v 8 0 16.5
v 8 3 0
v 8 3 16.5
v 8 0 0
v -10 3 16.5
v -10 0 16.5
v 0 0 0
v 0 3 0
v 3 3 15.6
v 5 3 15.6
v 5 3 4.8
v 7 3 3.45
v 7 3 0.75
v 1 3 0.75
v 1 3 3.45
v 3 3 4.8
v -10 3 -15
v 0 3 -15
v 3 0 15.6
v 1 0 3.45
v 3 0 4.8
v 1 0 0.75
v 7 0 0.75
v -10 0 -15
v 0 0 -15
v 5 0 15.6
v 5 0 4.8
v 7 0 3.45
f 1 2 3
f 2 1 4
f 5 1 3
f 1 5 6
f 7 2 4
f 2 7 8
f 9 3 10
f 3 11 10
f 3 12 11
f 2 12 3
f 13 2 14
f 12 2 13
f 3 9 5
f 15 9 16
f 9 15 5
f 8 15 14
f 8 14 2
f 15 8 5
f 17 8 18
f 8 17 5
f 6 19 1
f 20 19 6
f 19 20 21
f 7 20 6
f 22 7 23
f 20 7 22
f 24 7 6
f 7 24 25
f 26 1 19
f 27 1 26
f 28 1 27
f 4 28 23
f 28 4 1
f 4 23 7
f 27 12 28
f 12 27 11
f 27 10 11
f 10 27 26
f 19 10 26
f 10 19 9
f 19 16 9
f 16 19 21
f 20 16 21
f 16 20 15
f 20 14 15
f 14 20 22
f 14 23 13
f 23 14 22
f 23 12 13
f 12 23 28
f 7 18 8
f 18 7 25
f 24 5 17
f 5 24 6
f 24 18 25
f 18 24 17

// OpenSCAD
// file: spiral_extrude.scad
//Copyright 2018 Douglas Peale
//This transformation extrudes a two dimmenional shape in a spiral. It fills the gap between linear_extrude and rotate_extrude
//This is released under the GPL version 3.0
//
// Note that this uses linear_extrude to create segments of the spiral and piece them together. Twist is used to get the pieces to mate up properly.
// This makes the job much more complicated than it would have been if I could get access to the data points of the 2D objects this function is passed.
// Version 2.0
// Add capability of having Height=0 for flat spirals
// Fix Starts so that it actually works
// Version 3.0
// Reimplemented this function to simplify it, and allow circular and circular arc extrudes.
// fixed bug that prevented acurate heights and arc lengths from being implemented (previously an integer number of segments was used).
// Wrote wraper function with old name for backwards compatibility.
// Version 3.1
// fixed a bug where one more step than requested was added to the spiral.

//Simple Example
    //Multiple shapes, start and end radius the same
spiral_extrude(Radius=19, EndRadius=19, Pitch=10, Height=30, StepsPerRev=50, Starts=1){circle($fn=20,1);translate([10,0,0])rotate([0,0,20])square([5,2],center=true);}

    //Start and End radius different, negative pitch
translate([0,60,0])spiral_extrude(Radius=19, EndRadius=5, Pitch=-10, Height=30, StepsPerRev=50, Starts=1){rotate([0,0,20])square([5,2],center=true);}

    //Flat Spiral
translate([60,0,0])spiral_extrude(Radius=10, EndRadius=20, Pitch=3, Height=0, StepsPerRev=50, Starts=1){scale([1,2])circle($fn=20,1);}

    //Multiple Starts
translate([0,-60,0])spiral_extrude(Radius=19, EndRadius=5, Pitch=20, Height=30, StepsPerRev=50, Starts=3){rotate([0,0,20])square([5,2],center=true);}

    //Circular
translate([-60,0,0])extrude_spiral(StartRadius=10, Angle=360, RPitch=0, ZPitch=0, StepsPerRev=50){
    square([1,5]);
}
    //Circular arc
translate([-50,-50,0])extrude_spiral(StartRadius=10, Angle=234.25, RPitch=0, ZPitch=0, StepsPerRev=36){
    square([1,5]);
}

//Transforms a two dimmensional object in the XY plane to a spiral extrusion with a cross section perpendicular to the extrusion of the original two dimmensional object.
// Radius is the inital radius of the spiral.
// EndRadius is the final radius of the spiral. If not specified, it is the same as Radius.
// Spiral proceeds counter clockwise from start radius to end radius.
// Pitch is the change in Z per revolution of the spiral (this can be negative) unless Height is zero, in which case Pitch is the change in Radius/revolution.
// Starts is the number of spirals.
// Height is the total height of the spiral (this should be positive), can be zero. If pitch is positive, height goes up, if pitch is negative, height goes down
// StepsPerRev is the number of linear extruded segments per revolution of the spiral. A larger number generates a smoother spiral

    //Wraper function for backwords compatibility.
module spiral_extrude(Radius=1,EndRadius=-1,Pitch=50,Starts=1,Height=1,StepsPerRev=50){
    Angle=abs((Height!=0)?360*Height/Pitch:360*(Radius-EndRadius)/Pitch);
    ZPitch=(Height!=0)?Pitch:0;
    RPitch=(Height!=0)?((EndRadius!=-1)?(EndRadius-Radius)/abs(Height/Pitch):0):Pitch;
    
    extrude_spiral(StartRadius=Radius, Angle=Angle, ZPitch=ZPitch, RPitch=RPitch, StepsPerRev=StepsPerRev,Starts=Starts)children();
}


    // Start radius is the radius at which the extrude will start.
    // Angle is the number of degrees of rotation of the extrusion. This is always counter clock wise about the z axis.
    // ZPitch is the change in height per revolution, can be negative.
    // RPitch is the change in radius per revolution, can be negative.
    // StepsPerRev is the number of segments that will be drawn per revolution. Note that the last segment can be a partial segment.
    // Starts is the number of equally spaced copies of the spiral that will be drawn.
module extrude_spiral(StartRadius=10,Angle=360,ZPitch=0,RPitch=0,StepsPerRev=50,Starts=1){
    NumberOfSteps=ceil(Angle/360*StepsPerRev)-1;
        //Number of degrees of last step to use.
    Remainder=((Angle/360*StepsPerRev)-floor(Angle/360*StepsPerRev));
    for(i=[0:NumberOfSteps]){
        for(j=[0:Starts-1]){
            rotate([0,0,360*i/StepsPerRev+360*j/Starts]){
                    //Current Radius
                LocRadius=StartRadius+i*RPitch/StepsPerRev;
                    //Radius at next junction
                LocRadiusJoint=LocRadius/cos(360/(2*StepsPerRev))-RPitch*360/StepsPerRev/2;
                    //Length of line connecting endpoints of the current radius and the radius of the next joint
                TaperLen=sqrt(pow(LocRadius,2)+pow(LocRadiusJoint,2)-2*LocRadius*LocRadiusJoint*cos(360/(2*StepsPerRev)));
                    //Angle of above line relative to the current radius
                TaperAngle=90-asin(max(min(sin(360/(2*StepsPerRev))*LocRadiusJoint/TaperLen,1),-1));
 
                translate([LocRadius,0,i*ZPitch/StepsPerRev]){
                    segment(Radius=LocRadius, ZPitch=ZPitch, StepsPerRev=StepsPerRev, First=i==0, Last=(i==NumberOfSteps)?Remainder:0,RPitch=RPitch)children();
                }
            }
        }
    }
}

    //This module builds the segments that make up the spiral
module segment(Radius=1, ZPitch=1, StepsPerRev=10,First=false,Last=false,RPitch=0){
    render(){
            //Length of the extrusion needed to cover the angle determined by StepsPerRev
        LengthOfSegment=Radius*2*sin(360/(2*StepsPerRev))/cos(atan2(ZPitch,(2*PI*Radius)));
        
            //angle of extrusion relative to the XY plane
        SlopeAngle=atan2(ZPitch,(2*PI*Radius));
        
            //Radius Change per step
        RChange=RPitch/StepsPerRev;
            //Angle change per step
        StepAngle=360/StepsPerRev;
            //Stuff for calculating the angle relative to a radial line
        Opposite=Radius-(Radius+RChange)*cos(StepAngle);
        Adjacent=(Radius+RChange)*sin(StepAngle);
        
        SpiralAngle=atan2(Opposite,Adjacent);
            
        difference(){
            rotate([90+SlopeAngle,0,SpiralAngle]){
                
                    //Make extrusion 20 times as long as the gap to allow trimming to proper angle
                    //twist 20 times as much to account for 20 times the length
                    //I think the twist should be -20*360/StepsPerRev*sin(SlopeAngle), but for some reason -18 works better.
                rotate([0,0,-0.5*19*360/StepsPerRev*sin(SlopeAngle)])linear_extrude(center=true,height=20*LengthOfSegment,twist=-13.5*360/StepsPerRev*sin(SlopeAngle),convexity=10)children();
            }
                //Cut the ends of the extrusion to the proper angle for mating. Cubes are really big because I can't figure out how to ask OpenSCAD how big the 2D object is that I am extruding.
            translate([0,Last?Radius*tan(Last*360/StepsPerRev):Radius*tan(360/StepsPerRev),Last?Last*ZPitch/StepsPerRev:ZPitch/StepsPerRev])rotate([SlopeAngle,0,Last?Last*360/StepsPerRev:360/StepsPerRev]) translate([-5000,0,-5000])cube(10000);
            translate([0,0,0])rotate([SlopeAngle,0,0]) translate([0,-5000.01,0])cube(10000,center=true);
        }    
    }
}
// main file
use <spiral_extrude.scad>;

w = 2; // Track width
g = 1; // Track gap
h = 1.5; // Track height
rh = 16; // Ribbon height
s = 30;

scale([1,1,1.5]) union() {
    difference() {
        translate([-2,0,0]) cube([10,3,11]);
        translate([1,3,0.5]) rotate([90, 0, 0]) scale([1,0.9]) linear_extrude(5) polygon([
            [0,0],
            [0,2],
            [2,3],
            [2,11],
            [4,11],
            [4,3],
            [6,2],
            [6,0],
        ]);
    }
    translate([-10,0,0]) cube([10,3,11]);
    translate([-10,0,-10]) cube([10,3,11]);
}
